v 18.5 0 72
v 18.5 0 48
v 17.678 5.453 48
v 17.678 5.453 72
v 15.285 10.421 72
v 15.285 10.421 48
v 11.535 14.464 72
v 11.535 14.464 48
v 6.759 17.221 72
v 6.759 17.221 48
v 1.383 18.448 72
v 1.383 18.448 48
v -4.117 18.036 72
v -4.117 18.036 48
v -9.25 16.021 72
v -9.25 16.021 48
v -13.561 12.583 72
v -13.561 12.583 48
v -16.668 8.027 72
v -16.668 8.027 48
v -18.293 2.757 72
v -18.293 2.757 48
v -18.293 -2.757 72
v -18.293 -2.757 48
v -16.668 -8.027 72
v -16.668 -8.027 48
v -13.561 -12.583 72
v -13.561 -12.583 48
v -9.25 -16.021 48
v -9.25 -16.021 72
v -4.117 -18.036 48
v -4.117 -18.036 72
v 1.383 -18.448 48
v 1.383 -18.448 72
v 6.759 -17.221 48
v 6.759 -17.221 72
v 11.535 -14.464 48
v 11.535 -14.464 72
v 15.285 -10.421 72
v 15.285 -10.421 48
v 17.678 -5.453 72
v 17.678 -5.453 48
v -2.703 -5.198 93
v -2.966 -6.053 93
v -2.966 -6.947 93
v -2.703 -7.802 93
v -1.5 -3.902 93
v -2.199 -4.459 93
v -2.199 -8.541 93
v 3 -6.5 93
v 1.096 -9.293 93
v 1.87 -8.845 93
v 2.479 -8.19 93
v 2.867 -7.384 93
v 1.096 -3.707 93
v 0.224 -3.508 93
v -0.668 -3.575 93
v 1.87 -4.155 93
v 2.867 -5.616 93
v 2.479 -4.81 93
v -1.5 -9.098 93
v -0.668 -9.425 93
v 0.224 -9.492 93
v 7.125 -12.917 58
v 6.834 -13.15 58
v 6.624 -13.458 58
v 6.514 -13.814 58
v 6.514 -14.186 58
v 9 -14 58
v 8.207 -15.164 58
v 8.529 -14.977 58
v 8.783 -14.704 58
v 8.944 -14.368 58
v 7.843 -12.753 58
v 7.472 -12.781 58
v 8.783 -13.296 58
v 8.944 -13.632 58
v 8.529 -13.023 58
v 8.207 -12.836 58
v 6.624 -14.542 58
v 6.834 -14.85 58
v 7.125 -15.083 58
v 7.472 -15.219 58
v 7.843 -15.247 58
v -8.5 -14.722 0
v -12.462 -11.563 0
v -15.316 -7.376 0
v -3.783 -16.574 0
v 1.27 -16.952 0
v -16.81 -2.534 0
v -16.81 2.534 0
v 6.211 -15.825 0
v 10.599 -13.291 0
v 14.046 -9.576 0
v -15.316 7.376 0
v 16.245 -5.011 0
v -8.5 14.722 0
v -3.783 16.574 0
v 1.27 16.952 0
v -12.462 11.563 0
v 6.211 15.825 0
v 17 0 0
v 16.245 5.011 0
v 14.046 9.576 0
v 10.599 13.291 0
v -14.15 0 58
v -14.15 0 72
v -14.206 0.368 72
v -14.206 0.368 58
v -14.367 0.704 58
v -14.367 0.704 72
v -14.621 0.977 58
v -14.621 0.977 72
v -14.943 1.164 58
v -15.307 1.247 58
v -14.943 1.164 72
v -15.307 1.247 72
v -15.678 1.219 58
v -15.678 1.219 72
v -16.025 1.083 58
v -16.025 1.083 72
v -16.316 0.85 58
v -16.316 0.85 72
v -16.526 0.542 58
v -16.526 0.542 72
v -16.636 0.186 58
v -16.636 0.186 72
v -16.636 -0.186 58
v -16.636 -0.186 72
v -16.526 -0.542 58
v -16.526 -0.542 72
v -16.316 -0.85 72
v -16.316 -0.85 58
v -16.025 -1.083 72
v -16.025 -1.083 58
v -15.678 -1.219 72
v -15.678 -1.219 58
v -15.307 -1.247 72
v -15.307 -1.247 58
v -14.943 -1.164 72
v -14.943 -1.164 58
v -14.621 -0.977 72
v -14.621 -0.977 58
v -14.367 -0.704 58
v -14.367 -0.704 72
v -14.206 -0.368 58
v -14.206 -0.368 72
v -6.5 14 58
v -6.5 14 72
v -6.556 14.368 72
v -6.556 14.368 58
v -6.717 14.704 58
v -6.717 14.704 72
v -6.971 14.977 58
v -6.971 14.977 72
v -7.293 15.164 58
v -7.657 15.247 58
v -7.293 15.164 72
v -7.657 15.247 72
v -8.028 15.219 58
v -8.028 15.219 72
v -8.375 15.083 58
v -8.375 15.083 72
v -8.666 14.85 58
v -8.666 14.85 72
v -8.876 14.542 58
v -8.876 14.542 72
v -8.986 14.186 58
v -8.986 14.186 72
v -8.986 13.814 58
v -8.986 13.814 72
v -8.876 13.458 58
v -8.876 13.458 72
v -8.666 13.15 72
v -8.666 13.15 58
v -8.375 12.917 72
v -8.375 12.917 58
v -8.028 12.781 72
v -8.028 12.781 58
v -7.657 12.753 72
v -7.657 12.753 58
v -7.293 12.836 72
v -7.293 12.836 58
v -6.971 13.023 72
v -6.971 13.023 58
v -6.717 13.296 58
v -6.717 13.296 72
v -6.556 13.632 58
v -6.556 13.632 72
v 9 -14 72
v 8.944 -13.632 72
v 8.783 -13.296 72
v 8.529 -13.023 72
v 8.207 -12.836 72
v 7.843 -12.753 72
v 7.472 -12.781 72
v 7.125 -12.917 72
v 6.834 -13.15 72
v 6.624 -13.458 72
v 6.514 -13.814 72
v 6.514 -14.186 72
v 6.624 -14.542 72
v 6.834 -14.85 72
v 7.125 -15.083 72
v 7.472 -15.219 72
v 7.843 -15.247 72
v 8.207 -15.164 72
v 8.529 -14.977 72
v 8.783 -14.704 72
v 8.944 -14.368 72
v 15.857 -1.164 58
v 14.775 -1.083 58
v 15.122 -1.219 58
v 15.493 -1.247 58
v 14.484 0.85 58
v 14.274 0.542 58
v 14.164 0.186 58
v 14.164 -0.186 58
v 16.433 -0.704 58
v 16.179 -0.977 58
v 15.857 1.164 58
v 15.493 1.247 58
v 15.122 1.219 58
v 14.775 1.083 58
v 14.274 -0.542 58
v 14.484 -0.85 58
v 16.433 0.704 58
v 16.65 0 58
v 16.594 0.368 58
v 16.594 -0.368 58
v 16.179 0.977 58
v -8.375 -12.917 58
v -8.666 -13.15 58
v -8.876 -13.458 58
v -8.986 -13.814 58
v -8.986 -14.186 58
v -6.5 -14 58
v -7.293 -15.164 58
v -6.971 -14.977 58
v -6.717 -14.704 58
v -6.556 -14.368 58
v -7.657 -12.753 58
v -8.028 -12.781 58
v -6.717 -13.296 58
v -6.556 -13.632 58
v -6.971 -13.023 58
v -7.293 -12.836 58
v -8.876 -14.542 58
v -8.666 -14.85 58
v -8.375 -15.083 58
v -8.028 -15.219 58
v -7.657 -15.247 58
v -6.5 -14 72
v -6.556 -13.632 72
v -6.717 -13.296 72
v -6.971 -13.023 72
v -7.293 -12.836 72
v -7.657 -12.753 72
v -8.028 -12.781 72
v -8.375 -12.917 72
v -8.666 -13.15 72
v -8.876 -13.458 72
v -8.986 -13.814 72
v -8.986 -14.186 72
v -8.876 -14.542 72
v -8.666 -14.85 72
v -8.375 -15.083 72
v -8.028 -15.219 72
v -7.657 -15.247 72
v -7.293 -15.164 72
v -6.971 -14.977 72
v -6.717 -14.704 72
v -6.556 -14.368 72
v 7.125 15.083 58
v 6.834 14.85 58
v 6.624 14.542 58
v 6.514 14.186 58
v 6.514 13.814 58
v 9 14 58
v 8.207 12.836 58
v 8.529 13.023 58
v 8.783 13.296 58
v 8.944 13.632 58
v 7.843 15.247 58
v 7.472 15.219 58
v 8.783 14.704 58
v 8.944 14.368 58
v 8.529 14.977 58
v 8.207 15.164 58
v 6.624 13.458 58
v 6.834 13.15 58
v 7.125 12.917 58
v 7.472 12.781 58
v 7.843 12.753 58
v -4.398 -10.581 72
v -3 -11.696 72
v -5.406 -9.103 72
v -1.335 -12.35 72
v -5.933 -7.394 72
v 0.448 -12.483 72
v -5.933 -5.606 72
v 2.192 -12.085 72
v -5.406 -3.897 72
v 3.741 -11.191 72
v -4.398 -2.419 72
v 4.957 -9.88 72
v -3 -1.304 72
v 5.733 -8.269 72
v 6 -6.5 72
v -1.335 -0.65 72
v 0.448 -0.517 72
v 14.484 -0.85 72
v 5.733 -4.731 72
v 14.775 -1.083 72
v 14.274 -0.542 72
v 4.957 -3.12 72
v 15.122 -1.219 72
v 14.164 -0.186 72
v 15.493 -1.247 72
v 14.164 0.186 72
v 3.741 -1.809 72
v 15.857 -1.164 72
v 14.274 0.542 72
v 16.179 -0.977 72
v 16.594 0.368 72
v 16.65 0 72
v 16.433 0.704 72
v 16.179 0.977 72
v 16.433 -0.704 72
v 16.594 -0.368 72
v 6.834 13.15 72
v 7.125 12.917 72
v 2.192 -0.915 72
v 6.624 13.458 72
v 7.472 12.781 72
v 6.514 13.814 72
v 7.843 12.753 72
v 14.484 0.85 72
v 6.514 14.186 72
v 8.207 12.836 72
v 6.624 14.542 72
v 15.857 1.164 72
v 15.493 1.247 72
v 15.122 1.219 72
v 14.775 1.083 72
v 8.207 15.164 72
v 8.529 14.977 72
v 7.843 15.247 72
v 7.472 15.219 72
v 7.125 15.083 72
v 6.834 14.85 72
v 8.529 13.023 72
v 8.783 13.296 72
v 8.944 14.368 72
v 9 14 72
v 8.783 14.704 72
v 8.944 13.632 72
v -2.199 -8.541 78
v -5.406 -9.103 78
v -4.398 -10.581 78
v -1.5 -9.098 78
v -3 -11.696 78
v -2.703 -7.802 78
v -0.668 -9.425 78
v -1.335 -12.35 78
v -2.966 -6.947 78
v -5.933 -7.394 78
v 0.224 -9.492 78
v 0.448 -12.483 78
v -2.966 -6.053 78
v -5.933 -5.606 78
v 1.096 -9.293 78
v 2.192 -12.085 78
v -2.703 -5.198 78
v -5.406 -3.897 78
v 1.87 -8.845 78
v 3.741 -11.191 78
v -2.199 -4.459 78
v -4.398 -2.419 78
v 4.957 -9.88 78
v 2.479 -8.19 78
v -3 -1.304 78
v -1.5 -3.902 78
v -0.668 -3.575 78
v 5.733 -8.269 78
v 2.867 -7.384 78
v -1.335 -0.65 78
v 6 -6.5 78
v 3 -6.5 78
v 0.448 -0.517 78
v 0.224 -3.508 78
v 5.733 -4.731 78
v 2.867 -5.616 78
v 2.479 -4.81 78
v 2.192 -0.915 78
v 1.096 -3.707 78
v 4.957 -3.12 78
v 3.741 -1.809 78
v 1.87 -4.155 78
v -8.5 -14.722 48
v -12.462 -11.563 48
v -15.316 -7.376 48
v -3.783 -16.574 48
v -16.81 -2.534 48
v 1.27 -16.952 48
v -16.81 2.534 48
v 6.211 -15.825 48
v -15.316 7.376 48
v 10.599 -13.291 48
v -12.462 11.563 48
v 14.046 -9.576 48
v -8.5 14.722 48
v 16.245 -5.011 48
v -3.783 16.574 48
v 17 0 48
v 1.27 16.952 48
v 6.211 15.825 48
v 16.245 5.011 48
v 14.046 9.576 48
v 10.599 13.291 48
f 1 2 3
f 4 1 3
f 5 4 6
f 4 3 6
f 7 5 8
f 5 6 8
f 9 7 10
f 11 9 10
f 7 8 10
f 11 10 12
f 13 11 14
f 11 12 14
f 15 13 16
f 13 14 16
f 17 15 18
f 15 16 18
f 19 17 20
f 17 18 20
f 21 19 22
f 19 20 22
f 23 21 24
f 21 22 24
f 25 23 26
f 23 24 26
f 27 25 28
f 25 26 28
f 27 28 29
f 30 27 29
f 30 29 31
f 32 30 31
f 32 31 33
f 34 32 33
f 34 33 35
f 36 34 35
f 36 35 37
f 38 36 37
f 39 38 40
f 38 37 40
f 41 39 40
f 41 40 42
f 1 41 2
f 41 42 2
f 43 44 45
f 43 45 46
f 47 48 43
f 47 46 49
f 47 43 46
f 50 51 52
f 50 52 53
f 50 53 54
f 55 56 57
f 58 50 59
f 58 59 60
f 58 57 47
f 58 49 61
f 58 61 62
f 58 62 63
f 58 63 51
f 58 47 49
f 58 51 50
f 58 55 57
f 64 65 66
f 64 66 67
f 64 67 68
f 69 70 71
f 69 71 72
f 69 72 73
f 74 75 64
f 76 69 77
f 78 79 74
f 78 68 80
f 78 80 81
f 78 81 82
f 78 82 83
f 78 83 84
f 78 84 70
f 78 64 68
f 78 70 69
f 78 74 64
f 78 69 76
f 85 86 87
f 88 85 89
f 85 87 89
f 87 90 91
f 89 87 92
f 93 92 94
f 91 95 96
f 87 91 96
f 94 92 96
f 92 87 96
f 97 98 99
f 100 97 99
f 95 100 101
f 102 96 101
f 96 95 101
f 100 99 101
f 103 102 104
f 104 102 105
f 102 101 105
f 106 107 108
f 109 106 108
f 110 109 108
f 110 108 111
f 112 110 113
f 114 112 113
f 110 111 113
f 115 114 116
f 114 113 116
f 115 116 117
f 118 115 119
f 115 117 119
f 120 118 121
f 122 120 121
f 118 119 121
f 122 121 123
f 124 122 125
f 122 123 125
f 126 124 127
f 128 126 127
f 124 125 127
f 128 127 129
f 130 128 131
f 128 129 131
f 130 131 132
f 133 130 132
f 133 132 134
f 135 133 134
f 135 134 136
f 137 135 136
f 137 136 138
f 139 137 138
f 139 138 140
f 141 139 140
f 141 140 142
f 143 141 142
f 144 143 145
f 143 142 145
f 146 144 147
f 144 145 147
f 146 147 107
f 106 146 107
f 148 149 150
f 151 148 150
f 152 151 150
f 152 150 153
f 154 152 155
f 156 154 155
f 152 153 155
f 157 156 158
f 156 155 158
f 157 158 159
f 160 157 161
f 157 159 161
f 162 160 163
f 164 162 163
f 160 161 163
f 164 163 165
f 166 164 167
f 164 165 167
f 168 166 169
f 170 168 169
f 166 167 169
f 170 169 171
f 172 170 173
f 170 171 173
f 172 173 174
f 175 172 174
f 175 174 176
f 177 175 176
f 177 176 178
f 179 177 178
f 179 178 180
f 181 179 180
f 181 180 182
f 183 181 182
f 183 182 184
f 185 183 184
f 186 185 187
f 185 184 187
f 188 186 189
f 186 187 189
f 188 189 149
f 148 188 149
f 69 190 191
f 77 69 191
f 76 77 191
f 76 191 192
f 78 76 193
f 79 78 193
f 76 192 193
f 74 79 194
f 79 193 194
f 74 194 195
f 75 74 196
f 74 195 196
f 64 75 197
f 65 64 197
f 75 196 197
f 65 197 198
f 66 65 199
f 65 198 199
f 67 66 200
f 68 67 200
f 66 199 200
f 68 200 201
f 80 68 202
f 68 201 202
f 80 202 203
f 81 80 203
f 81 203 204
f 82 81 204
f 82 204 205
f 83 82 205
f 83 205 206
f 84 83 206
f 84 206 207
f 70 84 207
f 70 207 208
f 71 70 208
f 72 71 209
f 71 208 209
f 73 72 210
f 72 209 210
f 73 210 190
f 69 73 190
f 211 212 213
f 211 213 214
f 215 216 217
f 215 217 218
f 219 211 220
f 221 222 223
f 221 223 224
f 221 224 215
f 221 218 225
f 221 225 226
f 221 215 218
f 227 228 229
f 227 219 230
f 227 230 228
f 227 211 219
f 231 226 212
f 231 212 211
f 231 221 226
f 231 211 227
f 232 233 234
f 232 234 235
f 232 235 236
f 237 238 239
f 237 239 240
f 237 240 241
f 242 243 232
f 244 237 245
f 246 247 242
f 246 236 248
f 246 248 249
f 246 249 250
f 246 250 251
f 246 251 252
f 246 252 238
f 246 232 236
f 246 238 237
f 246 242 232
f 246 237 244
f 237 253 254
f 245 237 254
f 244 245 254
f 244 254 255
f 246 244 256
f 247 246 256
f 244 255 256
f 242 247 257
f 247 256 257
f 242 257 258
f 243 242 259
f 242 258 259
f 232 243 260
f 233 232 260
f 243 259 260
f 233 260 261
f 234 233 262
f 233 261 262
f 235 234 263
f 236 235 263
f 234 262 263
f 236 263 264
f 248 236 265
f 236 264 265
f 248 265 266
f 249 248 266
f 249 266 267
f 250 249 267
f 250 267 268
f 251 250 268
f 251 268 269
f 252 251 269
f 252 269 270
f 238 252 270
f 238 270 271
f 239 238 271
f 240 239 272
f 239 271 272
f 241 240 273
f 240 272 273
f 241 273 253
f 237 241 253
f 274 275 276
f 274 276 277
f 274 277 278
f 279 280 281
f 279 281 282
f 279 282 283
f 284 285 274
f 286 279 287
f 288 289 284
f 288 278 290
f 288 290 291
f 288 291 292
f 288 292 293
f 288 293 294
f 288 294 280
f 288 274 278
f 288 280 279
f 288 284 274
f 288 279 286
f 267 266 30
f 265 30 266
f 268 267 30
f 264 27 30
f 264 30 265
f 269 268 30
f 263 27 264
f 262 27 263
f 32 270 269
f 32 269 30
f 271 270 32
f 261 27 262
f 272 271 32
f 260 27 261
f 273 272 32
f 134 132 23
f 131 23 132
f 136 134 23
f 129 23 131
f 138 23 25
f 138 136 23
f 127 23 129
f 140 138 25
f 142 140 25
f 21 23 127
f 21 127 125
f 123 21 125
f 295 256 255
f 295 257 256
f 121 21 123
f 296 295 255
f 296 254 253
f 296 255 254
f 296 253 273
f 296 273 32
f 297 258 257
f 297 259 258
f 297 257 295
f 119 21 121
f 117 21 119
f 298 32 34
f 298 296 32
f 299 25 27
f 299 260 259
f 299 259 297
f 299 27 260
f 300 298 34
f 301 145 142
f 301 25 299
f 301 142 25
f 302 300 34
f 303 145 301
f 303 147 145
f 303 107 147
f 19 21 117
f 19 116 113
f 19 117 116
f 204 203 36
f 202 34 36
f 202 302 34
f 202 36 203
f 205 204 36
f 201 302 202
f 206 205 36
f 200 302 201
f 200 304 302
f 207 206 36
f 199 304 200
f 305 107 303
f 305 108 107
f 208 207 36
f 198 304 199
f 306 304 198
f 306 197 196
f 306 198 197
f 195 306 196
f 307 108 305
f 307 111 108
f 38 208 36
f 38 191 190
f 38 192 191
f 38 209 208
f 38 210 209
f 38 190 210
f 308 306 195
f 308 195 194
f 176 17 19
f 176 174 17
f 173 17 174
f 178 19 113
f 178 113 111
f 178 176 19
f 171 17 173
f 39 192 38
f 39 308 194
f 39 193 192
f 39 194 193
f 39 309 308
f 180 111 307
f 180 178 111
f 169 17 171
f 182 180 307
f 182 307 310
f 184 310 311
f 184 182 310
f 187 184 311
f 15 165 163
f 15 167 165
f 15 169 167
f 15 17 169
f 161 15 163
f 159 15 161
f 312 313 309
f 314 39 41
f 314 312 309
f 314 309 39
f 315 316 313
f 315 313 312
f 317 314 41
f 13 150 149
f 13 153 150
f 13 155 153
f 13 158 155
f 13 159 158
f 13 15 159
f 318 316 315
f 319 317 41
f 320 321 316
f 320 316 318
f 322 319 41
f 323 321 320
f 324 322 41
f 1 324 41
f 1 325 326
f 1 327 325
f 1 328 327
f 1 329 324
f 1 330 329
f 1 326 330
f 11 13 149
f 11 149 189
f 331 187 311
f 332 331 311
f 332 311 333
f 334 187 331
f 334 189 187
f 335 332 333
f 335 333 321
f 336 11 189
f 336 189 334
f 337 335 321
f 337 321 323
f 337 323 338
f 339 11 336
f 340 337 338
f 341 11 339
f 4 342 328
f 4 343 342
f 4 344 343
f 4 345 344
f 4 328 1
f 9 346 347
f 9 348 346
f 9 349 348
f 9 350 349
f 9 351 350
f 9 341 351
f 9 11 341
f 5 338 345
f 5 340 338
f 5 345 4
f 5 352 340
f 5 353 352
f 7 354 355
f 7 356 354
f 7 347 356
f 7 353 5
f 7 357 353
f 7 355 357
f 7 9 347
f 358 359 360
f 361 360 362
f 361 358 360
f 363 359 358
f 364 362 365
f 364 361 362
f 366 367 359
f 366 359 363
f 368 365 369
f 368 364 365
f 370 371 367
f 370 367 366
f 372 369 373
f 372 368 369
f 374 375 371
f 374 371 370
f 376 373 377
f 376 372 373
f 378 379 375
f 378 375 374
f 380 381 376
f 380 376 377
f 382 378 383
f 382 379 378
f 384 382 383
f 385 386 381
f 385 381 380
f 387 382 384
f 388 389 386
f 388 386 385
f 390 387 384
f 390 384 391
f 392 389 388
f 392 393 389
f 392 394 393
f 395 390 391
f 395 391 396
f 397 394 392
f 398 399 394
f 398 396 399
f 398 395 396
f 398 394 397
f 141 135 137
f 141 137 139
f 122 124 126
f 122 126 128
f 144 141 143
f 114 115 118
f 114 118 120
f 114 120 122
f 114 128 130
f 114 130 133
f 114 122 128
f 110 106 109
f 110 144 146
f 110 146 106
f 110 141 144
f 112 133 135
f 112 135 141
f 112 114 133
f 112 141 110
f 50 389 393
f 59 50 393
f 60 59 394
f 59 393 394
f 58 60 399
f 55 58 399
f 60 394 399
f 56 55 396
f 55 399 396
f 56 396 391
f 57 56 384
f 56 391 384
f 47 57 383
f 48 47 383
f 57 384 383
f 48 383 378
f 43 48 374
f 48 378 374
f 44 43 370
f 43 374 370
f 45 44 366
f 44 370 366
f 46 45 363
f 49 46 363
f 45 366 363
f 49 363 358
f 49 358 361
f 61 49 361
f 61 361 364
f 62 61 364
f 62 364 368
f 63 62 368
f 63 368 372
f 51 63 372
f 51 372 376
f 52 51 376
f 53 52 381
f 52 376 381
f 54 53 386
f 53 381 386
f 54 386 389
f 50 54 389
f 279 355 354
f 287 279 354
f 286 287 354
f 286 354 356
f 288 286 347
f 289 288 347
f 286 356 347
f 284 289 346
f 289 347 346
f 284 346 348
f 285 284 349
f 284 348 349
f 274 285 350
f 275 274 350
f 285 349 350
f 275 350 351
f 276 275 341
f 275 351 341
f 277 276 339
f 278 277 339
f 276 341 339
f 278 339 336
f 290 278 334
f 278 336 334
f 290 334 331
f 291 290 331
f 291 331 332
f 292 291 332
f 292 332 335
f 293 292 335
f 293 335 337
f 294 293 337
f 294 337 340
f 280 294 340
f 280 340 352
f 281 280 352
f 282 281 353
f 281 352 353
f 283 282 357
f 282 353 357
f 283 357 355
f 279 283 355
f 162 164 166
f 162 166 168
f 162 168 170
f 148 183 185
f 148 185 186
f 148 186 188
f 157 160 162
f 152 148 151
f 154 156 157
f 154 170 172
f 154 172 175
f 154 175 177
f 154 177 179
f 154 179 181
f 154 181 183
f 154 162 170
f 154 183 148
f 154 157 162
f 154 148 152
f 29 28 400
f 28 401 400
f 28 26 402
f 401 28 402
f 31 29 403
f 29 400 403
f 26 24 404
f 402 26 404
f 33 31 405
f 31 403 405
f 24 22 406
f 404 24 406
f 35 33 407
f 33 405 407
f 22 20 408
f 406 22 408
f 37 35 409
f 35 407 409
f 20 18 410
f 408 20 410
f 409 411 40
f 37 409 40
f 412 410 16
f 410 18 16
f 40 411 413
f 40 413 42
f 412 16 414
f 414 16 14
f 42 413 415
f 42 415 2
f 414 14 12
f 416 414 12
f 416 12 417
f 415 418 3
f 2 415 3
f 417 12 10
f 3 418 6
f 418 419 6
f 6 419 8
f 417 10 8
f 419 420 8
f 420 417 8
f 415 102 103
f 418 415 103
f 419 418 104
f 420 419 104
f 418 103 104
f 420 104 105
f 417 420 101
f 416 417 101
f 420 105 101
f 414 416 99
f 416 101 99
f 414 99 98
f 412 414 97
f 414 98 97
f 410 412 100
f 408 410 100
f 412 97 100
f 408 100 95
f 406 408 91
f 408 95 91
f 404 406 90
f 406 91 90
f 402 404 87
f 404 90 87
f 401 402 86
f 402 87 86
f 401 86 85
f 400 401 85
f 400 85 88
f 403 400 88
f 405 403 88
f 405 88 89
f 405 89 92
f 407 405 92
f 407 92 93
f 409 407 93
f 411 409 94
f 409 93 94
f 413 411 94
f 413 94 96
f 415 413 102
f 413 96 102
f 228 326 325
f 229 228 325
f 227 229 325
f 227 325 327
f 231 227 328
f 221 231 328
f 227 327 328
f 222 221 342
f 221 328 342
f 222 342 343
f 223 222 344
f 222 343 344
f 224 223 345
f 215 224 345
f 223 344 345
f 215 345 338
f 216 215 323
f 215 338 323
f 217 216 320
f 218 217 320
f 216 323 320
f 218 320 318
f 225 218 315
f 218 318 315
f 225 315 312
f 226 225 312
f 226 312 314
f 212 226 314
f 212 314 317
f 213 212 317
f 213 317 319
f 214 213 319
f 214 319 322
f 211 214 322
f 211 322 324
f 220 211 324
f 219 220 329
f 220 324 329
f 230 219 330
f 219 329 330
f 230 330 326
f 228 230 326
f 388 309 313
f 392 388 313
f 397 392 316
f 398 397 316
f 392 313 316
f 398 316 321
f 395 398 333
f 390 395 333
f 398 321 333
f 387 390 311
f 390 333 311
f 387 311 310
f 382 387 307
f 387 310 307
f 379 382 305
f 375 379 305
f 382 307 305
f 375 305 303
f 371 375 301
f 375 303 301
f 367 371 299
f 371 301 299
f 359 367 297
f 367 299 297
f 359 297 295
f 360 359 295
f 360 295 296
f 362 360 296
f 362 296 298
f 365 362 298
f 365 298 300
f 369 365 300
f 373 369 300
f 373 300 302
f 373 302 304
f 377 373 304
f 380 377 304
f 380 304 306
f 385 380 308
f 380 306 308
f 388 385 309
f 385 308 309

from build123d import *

# Parameters (mm, degrees)
CROQUIS1_R              = 17
SALIENTE_EXTRUIR1_DEPTH = 48
CROQUIS2_R              = 18.5
SALIENTE_EXTRUIR2_DEPTH = 24
CROQUIS3_R              = 6
SALIENTE_EXTRUIR3_DEPTH = 6
CROQUIS4_R              = 3
SALIENTE_EXTRUIR4_DEPTH = 15
CROQUIS5_R              = 1.25
CORTAR_EXTRUIR3_DEPTH   = 14


with BuildPart() as part:
    # Croquis1 → Saliente-Extruir1 (new body)
    with BuildSketch(Plane.XY):
        Circle(CROQUIS1_R)
    extrude(amount=SALIENTE_EXTRUIR1_DEPTH)

    # Croquis2 → Saliente-Extruir2 (add)
    with BuildSketch(Plane.XY.offset(48)):
        Circle(CROQUIS2_R)
    extrude(amount=SALIENTE_EXTRUIR2_DEPTH)

    # Croquis3 → Saliente-Extruir3 (add)
    with BuildSketch(Plane.XY.offset(72)):
        with Locations((0, -6.5)):
            Circle(CROQUIS3_R)
    extrude(amount=SALIENTE_EXTRUIR3_DEPTH)

    # Croquis4 → Saliente-Extruir4 (add)
    with BuildSketch(Plane.XY.offset(78)):
        with Locations((0, -6.5)):
            Circle(CROQUIS4_R)
    extrude(amount=SALIENTE_EXTRUIR4_DEPTH)

    # Croquis5 → Cortar-Extruir3 (cut)
    with BuildSketch(Plane.XY.offset(72)):
        with Locations((-7.75, -14)):
            Circle(CROQUIS5_R)
        with Locations((7.75, -14)):
            Circle(CROQUIS5_R)
        with Locations((-15.4, 0)):
            Circle(CROQUIS5_R)
        with Locations((15.4, 0)):
            Circle(CROQUIS5_R)
        with Locations((-7.75, 14)):
            Circle(CROQUIS5_R)
        with Locations((7.75, 14)):
            Circle(CROQUIS5_R)
    extrude(amount=-CORTAR_EXTRUIR3_DEPTH, mode=Mode.SUBTRACT)


solid = part.part
